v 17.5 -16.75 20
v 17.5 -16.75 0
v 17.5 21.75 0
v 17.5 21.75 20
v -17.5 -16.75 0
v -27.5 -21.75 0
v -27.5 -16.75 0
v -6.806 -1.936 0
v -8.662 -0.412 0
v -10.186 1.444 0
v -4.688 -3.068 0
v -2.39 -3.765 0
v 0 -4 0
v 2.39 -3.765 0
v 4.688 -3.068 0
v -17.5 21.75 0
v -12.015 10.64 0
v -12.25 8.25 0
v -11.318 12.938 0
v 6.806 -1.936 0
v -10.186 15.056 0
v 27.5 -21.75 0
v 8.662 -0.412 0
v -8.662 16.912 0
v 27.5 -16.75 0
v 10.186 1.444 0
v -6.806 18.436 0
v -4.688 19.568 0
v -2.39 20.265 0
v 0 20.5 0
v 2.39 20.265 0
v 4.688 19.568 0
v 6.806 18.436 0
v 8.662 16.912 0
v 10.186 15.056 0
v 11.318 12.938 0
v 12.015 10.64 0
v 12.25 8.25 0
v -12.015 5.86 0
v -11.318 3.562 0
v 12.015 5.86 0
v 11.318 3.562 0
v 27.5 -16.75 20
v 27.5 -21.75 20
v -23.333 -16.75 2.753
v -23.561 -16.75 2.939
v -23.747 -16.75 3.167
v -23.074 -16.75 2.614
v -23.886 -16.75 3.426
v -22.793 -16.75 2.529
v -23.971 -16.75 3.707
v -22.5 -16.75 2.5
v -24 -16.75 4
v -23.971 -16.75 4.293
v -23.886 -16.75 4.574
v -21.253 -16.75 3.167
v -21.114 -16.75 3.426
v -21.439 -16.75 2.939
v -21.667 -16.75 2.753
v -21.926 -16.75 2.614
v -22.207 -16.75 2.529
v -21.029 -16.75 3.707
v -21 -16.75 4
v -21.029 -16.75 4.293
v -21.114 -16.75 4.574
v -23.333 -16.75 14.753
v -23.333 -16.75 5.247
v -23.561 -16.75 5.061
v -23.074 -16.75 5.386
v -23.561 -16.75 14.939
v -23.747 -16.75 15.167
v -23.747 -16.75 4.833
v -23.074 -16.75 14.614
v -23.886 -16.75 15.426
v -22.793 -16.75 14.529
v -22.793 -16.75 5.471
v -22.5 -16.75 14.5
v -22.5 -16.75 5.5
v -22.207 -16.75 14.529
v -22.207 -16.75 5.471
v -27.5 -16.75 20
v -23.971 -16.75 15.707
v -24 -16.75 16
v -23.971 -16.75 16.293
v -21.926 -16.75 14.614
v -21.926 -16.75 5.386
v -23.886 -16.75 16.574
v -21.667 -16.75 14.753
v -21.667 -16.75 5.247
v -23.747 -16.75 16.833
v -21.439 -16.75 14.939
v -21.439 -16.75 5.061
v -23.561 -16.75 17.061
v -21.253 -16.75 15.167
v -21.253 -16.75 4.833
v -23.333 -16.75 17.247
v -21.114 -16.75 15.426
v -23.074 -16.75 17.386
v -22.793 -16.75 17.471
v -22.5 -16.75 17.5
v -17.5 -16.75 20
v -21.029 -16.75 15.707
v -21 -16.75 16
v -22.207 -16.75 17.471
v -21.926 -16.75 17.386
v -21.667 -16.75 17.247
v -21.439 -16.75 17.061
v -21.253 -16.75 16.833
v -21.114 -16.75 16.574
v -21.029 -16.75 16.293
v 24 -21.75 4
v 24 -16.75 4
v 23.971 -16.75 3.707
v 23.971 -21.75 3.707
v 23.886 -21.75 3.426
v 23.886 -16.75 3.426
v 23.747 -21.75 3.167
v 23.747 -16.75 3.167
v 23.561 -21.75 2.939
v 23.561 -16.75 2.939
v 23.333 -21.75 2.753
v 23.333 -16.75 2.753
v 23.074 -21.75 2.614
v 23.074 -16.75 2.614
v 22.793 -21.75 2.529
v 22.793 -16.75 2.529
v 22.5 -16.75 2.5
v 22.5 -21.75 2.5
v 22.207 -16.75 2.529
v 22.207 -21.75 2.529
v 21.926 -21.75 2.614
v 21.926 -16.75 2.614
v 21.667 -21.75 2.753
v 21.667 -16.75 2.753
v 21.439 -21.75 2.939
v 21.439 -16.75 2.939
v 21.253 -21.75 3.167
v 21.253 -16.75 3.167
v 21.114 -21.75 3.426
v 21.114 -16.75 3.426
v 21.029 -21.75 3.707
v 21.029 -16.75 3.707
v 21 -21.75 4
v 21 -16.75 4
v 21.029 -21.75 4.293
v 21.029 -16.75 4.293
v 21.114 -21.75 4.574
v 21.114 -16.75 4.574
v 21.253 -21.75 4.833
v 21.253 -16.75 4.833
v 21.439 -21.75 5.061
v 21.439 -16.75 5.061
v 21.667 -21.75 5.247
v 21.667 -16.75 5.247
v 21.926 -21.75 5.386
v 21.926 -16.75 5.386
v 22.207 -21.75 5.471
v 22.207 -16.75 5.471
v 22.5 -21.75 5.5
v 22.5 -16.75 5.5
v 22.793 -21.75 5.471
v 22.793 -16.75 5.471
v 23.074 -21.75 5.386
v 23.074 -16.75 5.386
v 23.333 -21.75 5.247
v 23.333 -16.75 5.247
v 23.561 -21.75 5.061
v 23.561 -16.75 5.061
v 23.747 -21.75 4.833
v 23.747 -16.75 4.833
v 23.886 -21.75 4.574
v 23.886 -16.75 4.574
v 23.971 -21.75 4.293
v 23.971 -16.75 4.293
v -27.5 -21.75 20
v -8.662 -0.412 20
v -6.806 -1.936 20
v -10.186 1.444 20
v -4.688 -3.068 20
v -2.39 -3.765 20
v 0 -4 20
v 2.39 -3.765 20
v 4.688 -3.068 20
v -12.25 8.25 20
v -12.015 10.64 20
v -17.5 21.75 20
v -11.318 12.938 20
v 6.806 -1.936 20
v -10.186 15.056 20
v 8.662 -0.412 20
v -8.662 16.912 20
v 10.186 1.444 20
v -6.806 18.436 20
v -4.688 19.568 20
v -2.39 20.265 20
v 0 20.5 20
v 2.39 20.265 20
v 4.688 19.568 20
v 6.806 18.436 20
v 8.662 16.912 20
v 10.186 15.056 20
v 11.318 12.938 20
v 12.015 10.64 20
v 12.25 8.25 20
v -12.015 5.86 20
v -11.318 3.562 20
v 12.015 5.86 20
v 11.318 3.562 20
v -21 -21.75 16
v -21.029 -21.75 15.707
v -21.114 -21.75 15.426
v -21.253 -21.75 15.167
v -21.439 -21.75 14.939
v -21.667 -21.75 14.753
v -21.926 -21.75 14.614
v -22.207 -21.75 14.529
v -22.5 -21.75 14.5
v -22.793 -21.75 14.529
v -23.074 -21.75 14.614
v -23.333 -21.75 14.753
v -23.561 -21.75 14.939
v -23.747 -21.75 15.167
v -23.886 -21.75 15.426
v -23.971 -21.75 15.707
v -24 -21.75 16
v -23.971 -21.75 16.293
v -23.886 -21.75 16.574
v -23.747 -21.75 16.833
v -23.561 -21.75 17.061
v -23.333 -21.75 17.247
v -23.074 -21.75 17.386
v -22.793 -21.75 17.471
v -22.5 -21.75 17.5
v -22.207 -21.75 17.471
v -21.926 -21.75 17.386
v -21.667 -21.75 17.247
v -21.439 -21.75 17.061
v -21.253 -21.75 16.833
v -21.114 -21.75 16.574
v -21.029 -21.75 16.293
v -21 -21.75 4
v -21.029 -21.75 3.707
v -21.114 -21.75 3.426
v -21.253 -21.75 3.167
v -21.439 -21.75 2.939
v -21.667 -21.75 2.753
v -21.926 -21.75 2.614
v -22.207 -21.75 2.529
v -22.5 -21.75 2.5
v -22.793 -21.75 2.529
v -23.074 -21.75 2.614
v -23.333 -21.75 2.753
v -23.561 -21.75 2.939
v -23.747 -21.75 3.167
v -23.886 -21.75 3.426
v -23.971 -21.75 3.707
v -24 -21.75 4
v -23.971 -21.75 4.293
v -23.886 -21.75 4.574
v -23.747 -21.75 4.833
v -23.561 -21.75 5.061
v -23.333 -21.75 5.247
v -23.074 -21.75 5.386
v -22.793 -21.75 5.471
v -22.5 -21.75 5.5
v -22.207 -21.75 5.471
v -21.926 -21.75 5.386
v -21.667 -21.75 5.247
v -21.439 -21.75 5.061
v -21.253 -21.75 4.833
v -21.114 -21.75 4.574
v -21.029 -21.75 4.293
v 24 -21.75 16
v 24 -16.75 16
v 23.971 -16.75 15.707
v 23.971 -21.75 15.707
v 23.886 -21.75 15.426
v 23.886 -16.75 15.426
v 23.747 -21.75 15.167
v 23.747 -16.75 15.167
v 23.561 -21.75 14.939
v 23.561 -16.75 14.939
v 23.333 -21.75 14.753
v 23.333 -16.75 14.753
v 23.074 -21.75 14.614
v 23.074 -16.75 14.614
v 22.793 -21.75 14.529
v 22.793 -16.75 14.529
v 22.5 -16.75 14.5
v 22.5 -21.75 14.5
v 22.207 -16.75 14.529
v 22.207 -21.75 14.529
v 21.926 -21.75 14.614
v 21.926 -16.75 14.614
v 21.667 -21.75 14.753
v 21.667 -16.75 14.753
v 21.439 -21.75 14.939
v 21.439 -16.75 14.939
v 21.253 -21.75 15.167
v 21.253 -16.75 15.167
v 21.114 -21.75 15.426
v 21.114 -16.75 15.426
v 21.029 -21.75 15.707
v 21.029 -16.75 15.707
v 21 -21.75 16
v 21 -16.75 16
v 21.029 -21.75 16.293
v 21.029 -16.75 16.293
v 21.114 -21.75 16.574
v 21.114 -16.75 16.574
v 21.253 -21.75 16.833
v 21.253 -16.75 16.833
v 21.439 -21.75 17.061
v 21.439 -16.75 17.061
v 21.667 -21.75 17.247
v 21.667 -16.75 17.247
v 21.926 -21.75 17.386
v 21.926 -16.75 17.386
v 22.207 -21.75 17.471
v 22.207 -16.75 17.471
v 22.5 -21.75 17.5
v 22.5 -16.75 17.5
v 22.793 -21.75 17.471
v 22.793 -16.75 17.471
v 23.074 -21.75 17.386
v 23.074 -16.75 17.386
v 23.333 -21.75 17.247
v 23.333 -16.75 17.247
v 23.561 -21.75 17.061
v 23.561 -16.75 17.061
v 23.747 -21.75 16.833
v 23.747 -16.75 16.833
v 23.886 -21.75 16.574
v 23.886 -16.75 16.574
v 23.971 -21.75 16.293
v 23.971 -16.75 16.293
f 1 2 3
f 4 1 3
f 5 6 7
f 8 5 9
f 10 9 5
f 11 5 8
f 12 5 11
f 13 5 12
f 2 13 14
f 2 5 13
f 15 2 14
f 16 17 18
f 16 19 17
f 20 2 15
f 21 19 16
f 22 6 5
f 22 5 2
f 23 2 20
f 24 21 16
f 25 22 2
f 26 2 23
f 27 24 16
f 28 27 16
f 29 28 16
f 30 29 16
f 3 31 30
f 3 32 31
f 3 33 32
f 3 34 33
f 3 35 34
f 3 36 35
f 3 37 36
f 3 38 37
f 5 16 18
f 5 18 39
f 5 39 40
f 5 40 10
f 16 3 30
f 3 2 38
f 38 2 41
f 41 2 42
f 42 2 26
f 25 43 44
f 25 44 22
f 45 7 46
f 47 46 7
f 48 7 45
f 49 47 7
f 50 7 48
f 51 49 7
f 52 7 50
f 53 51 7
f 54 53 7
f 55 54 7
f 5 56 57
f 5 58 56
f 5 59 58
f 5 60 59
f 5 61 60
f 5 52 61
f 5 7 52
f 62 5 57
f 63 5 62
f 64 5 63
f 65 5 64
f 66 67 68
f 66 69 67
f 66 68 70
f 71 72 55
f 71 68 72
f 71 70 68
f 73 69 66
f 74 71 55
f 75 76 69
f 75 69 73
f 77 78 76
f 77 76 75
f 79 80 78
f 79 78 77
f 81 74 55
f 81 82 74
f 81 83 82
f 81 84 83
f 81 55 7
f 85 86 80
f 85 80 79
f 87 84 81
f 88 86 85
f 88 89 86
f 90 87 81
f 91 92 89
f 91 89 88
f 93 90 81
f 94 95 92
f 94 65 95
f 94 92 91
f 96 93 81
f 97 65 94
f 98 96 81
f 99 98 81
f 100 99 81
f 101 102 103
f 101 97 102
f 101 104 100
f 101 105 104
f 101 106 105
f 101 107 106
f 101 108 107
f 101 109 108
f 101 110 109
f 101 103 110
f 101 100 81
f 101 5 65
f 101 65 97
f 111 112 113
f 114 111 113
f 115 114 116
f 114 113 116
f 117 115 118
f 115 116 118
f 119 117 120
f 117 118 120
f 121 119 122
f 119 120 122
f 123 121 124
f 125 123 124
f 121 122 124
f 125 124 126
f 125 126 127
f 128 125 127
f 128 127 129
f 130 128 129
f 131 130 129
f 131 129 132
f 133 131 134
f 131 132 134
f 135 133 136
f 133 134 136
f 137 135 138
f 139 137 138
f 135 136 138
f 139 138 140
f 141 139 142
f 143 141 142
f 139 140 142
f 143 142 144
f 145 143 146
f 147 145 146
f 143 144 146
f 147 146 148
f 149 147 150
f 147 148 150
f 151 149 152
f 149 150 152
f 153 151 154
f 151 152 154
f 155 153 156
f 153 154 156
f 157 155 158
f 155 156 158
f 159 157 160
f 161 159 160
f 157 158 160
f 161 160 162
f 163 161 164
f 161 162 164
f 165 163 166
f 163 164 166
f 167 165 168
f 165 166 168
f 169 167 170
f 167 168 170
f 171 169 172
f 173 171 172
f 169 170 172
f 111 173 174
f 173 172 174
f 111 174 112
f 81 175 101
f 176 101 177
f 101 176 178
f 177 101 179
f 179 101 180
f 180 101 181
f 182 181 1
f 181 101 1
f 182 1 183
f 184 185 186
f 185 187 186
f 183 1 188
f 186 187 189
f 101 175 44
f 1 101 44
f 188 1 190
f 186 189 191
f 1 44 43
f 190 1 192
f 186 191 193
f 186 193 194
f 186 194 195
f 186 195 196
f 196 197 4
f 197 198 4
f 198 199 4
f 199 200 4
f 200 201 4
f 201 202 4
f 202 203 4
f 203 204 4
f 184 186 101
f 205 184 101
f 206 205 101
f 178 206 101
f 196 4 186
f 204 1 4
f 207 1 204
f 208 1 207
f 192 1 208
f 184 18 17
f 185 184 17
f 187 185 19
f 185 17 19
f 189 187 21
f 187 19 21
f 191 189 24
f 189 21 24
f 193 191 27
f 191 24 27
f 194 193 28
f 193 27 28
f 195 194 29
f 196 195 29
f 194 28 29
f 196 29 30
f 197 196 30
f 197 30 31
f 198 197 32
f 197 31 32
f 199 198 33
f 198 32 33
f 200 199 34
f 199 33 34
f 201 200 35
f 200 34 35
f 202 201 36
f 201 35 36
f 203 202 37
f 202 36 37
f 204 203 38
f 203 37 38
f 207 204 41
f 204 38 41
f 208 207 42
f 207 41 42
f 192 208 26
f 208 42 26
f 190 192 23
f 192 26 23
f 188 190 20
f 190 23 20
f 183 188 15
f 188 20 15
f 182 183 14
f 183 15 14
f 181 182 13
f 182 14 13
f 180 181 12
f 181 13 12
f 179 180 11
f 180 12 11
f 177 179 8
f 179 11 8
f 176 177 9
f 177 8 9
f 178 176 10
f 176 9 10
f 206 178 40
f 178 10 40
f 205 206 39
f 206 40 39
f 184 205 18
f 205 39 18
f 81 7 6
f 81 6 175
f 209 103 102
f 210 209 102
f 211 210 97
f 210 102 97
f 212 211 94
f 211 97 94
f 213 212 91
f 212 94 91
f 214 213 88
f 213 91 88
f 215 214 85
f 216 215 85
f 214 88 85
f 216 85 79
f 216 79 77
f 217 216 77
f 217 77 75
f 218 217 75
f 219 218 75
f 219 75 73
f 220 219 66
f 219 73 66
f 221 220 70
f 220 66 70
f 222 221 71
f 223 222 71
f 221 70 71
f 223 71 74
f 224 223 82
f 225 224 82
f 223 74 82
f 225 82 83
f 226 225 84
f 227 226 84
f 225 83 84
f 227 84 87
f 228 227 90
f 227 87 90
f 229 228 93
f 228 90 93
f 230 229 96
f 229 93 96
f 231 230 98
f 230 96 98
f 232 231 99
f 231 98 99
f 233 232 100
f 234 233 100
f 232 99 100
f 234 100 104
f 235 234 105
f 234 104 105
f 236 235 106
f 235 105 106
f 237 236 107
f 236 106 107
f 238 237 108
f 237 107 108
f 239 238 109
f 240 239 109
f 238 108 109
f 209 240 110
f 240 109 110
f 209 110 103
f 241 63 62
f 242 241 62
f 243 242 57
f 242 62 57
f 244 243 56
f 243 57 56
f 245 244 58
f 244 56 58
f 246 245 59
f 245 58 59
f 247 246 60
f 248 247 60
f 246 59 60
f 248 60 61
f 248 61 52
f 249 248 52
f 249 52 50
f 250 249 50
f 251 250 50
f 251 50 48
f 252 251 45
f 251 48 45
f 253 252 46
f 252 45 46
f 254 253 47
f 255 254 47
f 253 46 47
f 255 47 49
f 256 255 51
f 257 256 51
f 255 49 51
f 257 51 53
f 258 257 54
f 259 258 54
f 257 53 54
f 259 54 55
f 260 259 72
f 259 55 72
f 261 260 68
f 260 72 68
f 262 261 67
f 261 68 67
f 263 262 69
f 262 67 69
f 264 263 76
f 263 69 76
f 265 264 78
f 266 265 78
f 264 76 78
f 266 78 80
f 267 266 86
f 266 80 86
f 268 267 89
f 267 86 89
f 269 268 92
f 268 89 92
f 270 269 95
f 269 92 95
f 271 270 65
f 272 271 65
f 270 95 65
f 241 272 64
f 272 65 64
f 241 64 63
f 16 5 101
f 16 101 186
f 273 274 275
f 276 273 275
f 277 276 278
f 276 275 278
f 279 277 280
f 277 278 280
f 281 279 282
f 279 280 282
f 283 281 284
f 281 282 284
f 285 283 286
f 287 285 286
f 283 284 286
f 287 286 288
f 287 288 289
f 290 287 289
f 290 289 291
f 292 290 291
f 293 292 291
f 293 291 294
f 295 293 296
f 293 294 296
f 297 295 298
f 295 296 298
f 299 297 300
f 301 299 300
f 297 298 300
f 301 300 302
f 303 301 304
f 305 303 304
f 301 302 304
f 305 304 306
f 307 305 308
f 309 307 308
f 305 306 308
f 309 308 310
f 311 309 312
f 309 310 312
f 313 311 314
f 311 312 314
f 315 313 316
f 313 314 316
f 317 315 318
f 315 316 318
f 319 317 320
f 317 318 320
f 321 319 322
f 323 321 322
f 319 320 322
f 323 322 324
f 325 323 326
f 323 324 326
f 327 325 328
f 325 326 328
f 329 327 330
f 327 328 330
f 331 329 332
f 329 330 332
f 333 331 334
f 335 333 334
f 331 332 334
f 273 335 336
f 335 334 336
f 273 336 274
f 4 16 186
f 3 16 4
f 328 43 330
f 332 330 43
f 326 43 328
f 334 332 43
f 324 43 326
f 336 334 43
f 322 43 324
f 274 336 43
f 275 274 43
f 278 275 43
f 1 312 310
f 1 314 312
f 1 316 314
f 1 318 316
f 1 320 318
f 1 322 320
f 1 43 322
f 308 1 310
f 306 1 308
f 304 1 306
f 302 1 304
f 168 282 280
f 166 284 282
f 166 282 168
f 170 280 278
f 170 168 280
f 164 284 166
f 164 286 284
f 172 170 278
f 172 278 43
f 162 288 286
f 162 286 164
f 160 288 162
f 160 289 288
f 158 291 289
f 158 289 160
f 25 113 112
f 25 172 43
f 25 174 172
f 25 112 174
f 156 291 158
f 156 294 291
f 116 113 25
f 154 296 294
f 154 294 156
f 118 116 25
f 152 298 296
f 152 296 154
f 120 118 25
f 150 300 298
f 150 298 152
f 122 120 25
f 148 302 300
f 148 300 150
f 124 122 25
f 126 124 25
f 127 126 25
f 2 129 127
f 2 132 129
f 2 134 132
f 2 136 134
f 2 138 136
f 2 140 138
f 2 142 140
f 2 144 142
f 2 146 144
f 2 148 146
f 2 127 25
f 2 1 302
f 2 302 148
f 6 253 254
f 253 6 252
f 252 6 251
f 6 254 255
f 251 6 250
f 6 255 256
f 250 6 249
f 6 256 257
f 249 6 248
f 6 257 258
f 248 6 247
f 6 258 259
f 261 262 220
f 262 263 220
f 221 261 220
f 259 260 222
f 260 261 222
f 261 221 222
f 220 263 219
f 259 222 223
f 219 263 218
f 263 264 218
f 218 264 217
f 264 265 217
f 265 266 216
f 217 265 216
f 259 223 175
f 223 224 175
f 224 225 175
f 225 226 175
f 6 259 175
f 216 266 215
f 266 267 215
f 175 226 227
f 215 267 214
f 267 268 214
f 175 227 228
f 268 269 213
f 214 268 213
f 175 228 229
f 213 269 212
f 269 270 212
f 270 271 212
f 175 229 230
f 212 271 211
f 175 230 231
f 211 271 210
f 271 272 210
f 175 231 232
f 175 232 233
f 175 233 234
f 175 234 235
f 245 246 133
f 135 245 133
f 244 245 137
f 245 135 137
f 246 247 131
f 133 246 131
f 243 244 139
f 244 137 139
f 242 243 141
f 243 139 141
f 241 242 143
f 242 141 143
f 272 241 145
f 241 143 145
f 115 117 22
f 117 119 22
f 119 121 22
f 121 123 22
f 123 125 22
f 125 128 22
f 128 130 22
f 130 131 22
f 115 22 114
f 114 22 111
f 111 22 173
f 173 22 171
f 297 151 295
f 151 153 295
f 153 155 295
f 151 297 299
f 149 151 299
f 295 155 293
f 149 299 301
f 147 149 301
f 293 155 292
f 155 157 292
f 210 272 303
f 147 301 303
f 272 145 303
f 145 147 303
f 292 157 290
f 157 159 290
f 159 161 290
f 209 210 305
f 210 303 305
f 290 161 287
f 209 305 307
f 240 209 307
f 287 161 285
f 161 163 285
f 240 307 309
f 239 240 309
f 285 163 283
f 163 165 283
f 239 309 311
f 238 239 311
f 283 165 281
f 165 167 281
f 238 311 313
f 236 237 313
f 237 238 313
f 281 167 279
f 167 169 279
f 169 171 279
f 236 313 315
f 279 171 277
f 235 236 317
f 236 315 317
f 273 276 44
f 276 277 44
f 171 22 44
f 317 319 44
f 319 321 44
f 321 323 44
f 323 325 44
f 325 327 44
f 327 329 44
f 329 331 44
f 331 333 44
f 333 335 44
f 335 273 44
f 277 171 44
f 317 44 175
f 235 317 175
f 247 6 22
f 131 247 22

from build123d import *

# Parameters (mm, degrees)
SKETCH_1_W          = 35
SKETCH_1_H          = 43.5
EXTRUDE_1_DEPTH     = 20
SKETCH_2_W          = 20
SKETCH_2_H          = 5
EXTRUDE_2_DEPTH     = 10
SKETCH_3_W          = 20
SKETCH_3_H          = 5
EXTRUDE_3_DEPTH     = 10
SKETCH_4_R          = 1.5
CUT_EXTRUDE_2_DEPTH = 5
SKETCH_5_R          = 12.25
CUT_EXTRUDE_3_DEPTH = 20


with BuildPart() as part:
    # Эскиз1 → Бобышка-Вытянуть1 (new body)
    with BuildSketch(Plane.XY):
        Rectangle(SKETCH_1_W, SKETCH_1_H)
    extrude(amount=EXTRUDE_1_DEPTH)

    # Эскиз2 → Бобышка-Вытянуть2 (add)
    with BuildSketch(Plane(origin=(17.5, 0, 0), x_dir=(0, 0, -1), z_dir=(1, 0, 0))):
        with Locations((-10, -19.25)):
            Rectangle(SKETCH_2_W, SKETCH_2_H)
    extrude(amount=EXTRUDE_2_DEPTH)

    # Эскиз3 → Бобышка-Вытянуть3 (add)
    with BuildSketch(Plane.ZY.offset(17.5)):
        with Locations((10, -19.25)):
            Rectangle(SKETCH_3_W, SKETCH_3_H)
    extrude(amount=EXTRUDE_3_DEPTH)

    # Эскиз4 → Вырез-Вытянуть2 (cut)
    with BuildSketch(Plane(origin=(0, -16.75, 0), x_dir=(1, 0, 0), z_dir=(0, 1, 0))):
        with Locations((-22.5, -16)):
            Circle(SKETCH_4_R)
        with Locations((-22.5, -4)):
            Circle(SKETCH_4_R)
        with Locations((22.5, -16)):
            Circle(SKETCH_4_R)
        with Locations((22.5, -4)):
            Circle(SKETCH_4_R)
    extrude(amount=-CUT_EXTRUDE_2_DEPTH, mode=Mode.SUBTRACT)

    # Эскиз5 → Вырез-Вытянуть3 (cut)
    with BuildSketch(Plane(origin=(0, 0, 0), x_dir=(-1, 0, 0), z_dir=(0, 0, -1))):
        with Locations((0, 8.25)):
            Circle(SKETCH_5_R)
    extrude(amount=-CUT_EXTRUDE_3_DEPTH, mode=Mode.SUBTRACT)


solid = part.part
